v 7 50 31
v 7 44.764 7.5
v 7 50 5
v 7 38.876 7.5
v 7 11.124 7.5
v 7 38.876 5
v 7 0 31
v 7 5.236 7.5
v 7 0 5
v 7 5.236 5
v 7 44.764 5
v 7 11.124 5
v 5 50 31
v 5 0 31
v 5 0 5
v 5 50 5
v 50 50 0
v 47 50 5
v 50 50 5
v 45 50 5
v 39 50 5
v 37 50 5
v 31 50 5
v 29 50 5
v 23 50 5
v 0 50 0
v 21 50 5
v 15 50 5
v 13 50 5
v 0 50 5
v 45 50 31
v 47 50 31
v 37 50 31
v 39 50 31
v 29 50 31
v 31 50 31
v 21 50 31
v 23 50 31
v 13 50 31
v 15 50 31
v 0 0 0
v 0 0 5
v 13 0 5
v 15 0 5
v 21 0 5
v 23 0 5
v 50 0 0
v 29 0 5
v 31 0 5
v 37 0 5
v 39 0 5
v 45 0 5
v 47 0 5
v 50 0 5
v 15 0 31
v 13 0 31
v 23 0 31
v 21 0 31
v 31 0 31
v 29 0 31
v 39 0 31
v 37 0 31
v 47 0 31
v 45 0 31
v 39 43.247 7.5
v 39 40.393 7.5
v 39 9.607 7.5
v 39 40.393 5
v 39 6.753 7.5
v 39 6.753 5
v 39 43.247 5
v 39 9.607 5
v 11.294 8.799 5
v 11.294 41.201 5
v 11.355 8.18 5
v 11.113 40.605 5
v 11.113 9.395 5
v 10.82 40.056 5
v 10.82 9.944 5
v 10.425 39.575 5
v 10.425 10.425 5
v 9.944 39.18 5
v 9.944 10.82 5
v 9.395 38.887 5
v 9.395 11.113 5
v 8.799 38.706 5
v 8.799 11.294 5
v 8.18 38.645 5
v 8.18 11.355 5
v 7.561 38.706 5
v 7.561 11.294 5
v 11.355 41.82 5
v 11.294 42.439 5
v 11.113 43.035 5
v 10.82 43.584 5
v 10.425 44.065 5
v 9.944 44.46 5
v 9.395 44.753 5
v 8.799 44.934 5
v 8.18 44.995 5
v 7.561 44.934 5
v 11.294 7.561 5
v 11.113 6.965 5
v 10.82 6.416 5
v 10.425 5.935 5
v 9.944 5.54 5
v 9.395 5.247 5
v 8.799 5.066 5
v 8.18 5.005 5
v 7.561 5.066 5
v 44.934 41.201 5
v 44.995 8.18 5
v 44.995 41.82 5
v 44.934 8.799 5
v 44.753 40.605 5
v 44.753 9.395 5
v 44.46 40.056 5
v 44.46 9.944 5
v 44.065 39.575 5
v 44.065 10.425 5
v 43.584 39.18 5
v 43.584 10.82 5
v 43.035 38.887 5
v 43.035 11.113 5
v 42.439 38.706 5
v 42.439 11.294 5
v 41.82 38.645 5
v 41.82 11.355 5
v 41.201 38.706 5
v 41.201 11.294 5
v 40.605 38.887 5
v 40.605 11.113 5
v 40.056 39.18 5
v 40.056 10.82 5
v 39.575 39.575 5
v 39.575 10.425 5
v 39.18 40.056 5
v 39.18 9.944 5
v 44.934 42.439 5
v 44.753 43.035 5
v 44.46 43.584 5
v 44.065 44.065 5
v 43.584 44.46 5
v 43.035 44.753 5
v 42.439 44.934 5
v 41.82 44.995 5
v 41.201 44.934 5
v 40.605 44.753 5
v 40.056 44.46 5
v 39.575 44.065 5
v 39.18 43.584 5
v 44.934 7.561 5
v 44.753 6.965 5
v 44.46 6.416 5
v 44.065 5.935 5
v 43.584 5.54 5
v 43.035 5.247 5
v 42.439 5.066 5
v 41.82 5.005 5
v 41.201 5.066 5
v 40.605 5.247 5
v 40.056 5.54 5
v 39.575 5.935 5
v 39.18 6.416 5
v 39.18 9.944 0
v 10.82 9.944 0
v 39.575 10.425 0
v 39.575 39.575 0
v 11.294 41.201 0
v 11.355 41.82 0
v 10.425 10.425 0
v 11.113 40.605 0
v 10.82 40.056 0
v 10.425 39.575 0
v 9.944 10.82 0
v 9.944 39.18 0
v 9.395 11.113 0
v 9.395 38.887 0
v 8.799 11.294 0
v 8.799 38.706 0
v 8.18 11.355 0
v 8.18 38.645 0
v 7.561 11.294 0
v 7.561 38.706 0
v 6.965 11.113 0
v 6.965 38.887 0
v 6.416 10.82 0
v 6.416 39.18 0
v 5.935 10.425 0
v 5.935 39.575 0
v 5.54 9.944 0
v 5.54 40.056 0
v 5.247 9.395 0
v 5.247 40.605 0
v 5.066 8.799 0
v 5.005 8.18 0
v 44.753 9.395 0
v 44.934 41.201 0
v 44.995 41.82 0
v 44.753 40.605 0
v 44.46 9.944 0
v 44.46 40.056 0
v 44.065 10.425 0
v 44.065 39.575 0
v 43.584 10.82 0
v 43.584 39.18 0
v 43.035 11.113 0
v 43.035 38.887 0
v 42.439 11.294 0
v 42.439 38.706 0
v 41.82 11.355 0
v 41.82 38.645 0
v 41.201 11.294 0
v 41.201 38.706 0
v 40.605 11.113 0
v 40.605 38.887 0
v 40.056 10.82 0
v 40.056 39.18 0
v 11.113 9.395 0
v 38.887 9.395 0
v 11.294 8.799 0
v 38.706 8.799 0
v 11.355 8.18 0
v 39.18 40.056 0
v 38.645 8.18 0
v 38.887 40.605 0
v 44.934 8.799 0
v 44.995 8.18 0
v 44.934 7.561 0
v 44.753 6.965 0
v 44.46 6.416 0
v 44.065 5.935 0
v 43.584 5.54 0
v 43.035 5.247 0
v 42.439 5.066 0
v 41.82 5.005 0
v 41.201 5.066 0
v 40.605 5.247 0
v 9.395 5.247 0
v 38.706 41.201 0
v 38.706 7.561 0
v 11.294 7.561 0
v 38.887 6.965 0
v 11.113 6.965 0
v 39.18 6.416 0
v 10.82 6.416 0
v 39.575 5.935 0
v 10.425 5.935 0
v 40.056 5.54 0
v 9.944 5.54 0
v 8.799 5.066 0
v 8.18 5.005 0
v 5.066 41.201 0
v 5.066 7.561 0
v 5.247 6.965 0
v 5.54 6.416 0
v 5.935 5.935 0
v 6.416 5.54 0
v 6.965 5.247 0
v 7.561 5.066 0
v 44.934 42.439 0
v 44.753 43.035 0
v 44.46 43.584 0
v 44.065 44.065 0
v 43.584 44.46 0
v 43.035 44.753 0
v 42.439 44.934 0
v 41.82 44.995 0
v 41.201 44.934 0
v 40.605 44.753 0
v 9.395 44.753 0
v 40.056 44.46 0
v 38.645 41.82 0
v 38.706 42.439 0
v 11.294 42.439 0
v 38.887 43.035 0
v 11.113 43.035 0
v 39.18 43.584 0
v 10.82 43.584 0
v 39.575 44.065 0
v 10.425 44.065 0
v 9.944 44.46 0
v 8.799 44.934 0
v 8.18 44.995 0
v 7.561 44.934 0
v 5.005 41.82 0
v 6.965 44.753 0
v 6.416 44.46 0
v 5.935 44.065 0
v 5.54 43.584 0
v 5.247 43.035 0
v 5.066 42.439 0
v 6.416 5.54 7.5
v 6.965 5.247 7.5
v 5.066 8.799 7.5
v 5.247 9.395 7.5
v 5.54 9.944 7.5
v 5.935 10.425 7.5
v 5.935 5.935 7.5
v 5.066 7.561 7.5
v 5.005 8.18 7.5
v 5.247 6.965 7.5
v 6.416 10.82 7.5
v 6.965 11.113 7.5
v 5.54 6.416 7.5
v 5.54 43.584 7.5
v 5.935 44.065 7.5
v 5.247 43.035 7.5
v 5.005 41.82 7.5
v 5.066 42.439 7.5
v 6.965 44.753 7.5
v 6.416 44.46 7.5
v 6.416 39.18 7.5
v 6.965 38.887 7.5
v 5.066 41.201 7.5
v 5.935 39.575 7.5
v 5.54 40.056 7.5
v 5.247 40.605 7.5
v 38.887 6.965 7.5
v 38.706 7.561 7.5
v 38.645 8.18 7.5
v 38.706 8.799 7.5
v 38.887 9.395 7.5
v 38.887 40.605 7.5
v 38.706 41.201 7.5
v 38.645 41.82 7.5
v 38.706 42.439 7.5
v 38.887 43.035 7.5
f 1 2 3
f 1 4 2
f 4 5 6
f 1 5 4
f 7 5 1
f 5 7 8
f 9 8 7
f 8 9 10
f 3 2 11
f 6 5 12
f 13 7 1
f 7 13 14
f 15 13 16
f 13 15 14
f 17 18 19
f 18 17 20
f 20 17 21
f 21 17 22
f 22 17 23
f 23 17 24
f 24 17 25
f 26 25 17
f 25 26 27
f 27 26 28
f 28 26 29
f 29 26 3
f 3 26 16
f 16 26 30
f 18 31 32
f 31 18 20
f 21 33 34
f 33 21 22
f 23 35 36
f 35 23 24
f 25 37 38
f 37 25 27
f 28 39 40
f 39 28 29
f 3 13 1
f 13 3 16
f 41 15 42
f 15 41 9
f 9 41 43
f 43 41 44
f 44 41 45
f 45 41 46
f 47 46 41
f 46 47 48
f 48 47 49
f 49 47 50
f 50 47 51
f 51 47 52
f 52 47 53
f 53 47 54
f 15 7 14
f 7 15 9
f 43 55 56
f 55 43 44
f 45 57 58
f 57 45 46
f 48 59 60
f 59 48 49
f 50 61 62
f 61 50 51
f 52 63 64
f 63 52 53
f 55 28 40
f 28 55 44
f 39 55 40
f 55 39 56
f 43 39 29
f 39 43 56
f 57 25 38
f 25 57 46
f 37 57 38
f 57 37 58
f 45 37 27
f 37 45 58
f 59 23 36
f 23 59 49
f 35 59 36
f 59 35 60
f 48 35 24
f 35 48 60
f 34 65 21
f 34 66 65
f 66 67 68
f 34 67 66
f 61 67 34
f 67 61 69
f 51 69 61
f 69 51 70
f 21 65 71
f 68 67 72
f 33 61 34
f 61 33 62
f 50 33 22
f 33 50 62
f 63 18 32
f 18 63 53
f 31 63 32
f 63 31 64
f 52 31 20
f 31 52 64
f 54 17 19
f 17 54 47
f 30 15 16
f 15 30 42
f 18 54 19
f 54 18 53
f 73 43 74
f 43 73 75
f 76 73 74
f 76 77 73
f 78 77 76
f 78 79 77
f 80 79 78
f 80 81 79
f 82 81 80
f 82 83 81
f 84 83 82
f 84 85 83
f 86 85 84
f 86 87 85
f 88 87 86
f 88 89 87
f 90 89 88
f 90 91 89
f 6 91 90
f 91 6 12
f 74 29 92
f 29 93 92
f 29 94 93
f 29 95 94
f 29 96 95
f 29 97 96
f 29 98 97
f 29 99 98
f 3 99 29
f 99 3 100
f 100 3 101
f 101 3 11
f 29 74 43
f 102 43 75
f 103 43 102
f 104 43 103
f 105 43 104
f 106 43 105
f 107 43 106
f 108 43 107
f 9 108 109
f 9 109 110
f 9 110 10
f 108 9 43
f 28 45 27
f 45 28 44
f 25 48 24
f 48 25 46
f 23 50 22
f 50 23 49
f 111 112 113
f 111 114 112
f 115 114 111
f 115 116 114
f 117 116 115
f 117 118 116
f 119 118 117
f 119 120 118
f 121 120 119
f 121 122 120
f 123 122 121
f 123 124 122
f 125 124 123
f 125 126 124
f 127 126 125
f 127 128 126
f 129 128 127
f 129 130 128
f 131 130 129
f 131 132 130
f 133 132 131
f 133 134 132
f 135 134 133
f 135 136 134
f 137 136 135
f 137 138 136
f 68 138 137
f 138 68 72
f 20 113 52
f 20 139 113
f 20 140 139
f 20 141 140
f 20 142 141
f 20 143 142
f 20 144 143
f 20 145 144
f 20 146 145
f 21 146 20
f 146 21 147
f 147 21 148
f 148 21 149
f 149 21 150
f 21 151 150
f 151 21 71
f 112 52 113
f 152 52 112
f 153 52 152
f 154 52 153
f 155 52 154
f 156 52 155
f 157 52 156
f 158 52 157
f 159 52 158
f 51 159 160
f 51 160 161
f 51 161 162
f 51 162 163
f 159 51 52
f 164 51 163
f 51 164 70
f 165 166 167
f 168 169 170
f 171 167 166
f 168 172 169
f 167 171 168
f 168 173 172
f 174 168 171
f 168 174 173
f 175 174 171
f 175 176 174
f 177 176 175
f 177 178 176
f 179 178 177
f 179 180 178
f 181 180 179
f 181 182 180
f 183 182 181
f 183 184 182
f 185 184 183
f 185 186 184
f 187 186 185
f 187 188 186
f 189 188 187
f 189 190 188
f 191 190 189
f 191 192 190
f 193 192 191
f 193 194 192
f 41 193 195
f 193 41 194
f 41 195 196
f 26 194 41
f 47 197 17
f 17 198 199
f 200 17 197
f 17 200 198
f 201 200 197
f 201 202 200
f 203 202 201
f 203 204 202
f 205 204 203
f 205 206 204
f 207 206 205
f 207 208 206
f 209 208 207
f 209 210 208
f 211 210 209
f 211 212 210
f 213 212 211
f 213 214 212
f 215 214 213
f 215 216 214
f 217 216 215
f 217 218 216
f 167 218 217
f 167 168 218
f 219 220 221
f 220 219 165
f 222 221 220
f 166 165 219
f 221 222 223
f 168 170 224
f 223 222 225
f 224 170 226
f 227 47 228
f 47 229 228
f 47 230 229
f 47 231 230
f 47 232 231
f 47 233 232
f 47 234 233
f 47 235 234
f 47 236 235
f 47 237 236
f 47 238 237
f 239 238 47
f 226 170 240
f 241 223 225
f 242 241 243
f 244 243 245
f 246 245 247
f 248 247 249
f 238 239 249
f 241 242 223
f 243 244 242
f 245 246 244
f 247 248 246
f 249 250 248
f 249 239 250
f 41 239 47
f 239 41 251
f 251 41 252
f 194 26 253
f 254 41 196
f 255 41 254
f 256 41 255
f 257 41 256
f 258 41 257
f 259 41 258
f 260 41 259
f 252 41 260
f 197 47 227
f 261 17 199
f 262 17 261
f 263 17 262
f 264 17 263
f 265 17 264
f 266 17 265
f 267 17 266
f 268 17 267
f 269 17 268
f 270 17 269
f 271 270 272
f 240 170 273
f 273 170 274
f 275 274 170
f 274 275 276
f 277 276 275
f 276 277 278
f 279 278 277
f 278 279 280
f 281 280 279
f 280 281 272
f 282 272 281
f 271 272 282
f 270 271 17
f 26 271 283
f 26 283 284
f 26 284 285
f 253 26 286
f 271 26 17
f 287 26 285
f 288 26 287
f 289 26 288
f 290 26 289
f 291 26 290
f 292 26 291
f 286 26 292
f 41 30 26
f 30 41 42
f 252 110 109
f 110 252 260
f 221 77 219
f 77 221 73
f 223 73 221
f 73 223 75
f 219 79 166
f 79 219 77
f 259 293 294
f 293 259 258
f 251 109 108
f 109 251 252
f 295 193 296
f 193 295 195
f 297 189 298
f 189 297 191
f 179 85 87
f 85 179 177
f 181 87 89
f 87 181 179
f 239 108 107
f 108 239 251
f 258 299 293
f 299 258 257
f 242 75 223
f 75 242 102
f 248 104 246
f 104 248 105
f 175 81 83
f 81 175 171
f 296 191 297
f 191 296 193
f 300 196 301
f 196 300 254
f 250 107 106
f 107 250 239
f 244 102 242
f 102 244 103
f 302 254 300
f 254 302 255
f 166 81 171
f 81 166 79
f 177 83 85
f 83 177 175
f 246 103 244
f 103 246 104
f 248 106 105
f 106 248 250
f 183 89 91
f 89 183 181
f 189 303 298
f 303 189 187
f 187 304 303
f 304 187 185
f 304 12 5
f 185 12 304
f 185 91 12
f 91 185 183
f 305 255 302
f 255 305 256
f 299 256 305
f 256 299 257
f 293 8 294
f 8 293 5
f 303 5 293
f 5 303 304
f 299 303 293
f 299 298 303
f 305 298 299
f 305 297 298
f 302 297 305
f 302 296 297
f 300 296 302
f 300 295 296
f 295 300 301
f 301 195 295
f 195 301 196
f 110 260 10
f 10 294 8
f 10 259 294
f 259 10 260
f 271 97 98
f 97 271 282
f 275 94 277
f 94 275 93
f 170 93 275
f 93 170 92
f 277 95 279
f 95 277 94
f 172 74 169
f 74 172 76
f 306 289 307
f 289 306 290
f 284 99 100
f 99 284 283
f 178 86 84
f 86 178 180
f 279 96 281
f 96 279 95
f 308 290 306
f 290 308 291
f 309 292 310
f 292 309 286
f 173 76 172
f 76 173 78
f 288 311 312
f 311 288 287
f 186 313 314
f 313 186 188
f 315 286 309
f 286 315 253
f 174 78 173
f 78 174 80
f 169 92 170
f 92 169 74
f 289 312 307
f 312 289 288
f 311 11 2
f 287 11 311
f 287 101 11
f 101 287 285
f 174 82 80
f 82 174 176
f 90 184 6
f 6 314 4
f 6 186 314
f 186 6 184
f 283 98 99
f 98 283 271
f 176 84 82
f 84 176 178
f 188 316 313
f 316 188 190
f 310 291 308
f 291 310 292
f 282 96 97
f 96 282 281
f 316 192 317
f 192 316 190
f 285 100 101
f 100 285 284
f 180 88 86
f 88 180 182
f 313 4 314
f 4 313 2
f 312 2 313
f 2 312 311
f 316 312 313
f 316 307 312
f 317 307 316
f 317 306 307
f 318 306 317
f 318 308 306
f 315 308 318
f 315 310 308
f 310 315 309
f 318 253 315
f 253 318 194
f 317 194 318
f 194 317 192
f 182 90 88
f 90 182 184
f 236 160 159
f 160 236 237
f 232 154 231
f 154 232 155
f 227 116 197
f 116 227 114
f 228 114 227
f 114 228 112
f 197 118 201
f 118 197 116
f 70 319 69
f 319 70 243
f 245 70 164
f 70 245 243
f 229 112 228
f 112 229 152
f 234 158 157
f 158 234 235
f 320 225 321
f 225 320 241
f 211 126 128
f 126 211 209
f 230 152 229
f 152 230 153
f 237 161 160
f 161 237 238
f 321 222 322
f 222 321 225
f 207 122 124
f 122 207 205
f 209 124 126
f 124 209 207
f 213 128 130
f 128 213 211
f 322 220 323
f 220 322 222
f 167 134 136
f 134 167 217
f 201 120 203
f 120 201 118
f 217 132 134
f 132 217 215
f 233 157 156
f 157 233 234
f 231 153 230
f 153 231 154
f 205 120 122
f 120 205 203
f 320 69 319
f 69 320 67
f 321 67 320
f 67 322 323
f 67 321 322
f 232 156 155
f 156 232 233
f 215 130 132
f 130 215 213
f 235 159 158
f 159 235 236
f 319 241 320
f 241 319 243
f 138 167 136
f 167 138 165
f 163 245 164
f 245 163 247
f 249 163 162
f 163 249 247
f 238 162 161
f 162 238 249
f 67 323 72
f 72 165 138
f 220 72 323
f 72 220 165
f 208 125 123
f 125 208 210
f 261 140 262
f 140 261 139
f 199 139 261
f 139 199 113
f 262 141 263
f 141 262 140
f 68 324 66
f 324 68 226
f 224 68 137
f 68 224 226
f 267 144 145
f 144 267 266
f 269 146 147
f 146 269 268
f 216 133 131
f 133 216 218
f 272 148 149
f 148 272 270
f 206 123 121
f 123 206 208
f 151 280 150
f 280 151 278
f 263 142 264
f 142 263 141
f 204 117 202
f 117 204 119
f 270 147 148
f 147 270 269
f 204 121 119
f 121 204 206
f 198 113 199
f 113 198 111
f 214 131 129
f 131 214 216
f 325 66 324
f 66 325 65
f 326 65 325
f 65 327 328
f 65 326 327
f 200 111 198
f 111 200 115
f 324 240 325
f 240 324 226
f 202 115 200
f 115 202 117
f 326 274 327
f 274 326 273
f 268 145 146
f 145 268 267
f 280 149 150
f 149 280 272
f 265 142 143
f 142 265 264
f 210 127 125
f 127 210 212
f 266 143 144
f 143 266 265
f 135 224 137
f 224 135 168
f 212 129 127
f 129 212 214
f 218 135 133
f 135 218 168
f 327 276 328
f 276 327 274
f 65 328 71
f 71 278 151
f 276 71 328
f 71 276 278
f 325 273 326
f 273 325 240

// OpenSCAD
$fn = 32;

// ----------------------------------------------------------------------
// Finned heat sink: 50 x 50 mm base, 26 mm fins
// ----------------------------------------------------------------------

// --- parameters (mm) ---
base_w = 50;              // base width
base_d = 50;              // base depth
base_t = 5;               // base thickness
fin_h = 26;               // fin height above the base
holes_d = 6.35;           // fixing holes
hole_x = 16.82;           // hole offset in x
hole_y = 16.82;           // hole offset in y
fin_t = 2;                // fin thickness
fin_pitch = 8;            // fin pitch
fin_count = 6;            // number of fins
fin_x0 = 5;               // first fin offset

difference() {
  union() {
    cube([base_w, base_d, base_t]);
    for (i = [0 : fin_count - 1]) {
      translate([fin_x0 + i * fin_pitch, 0, base_t - 0.5]) cube([fin_t, base_d, fin_h + 0.5]);
    }
  }
  /* fixing holes through the base, 2.5 mm clear on both sides */
  for (hx = [-16.82, 16.82]) {
    for (hy = [-16.82, 16.82]) {
      translate([base_w / 2 + hx, base_d / 2 + hy, -2.5]) cylinder(h = base_t + 5, d = holes_d);
    }
  }
}
